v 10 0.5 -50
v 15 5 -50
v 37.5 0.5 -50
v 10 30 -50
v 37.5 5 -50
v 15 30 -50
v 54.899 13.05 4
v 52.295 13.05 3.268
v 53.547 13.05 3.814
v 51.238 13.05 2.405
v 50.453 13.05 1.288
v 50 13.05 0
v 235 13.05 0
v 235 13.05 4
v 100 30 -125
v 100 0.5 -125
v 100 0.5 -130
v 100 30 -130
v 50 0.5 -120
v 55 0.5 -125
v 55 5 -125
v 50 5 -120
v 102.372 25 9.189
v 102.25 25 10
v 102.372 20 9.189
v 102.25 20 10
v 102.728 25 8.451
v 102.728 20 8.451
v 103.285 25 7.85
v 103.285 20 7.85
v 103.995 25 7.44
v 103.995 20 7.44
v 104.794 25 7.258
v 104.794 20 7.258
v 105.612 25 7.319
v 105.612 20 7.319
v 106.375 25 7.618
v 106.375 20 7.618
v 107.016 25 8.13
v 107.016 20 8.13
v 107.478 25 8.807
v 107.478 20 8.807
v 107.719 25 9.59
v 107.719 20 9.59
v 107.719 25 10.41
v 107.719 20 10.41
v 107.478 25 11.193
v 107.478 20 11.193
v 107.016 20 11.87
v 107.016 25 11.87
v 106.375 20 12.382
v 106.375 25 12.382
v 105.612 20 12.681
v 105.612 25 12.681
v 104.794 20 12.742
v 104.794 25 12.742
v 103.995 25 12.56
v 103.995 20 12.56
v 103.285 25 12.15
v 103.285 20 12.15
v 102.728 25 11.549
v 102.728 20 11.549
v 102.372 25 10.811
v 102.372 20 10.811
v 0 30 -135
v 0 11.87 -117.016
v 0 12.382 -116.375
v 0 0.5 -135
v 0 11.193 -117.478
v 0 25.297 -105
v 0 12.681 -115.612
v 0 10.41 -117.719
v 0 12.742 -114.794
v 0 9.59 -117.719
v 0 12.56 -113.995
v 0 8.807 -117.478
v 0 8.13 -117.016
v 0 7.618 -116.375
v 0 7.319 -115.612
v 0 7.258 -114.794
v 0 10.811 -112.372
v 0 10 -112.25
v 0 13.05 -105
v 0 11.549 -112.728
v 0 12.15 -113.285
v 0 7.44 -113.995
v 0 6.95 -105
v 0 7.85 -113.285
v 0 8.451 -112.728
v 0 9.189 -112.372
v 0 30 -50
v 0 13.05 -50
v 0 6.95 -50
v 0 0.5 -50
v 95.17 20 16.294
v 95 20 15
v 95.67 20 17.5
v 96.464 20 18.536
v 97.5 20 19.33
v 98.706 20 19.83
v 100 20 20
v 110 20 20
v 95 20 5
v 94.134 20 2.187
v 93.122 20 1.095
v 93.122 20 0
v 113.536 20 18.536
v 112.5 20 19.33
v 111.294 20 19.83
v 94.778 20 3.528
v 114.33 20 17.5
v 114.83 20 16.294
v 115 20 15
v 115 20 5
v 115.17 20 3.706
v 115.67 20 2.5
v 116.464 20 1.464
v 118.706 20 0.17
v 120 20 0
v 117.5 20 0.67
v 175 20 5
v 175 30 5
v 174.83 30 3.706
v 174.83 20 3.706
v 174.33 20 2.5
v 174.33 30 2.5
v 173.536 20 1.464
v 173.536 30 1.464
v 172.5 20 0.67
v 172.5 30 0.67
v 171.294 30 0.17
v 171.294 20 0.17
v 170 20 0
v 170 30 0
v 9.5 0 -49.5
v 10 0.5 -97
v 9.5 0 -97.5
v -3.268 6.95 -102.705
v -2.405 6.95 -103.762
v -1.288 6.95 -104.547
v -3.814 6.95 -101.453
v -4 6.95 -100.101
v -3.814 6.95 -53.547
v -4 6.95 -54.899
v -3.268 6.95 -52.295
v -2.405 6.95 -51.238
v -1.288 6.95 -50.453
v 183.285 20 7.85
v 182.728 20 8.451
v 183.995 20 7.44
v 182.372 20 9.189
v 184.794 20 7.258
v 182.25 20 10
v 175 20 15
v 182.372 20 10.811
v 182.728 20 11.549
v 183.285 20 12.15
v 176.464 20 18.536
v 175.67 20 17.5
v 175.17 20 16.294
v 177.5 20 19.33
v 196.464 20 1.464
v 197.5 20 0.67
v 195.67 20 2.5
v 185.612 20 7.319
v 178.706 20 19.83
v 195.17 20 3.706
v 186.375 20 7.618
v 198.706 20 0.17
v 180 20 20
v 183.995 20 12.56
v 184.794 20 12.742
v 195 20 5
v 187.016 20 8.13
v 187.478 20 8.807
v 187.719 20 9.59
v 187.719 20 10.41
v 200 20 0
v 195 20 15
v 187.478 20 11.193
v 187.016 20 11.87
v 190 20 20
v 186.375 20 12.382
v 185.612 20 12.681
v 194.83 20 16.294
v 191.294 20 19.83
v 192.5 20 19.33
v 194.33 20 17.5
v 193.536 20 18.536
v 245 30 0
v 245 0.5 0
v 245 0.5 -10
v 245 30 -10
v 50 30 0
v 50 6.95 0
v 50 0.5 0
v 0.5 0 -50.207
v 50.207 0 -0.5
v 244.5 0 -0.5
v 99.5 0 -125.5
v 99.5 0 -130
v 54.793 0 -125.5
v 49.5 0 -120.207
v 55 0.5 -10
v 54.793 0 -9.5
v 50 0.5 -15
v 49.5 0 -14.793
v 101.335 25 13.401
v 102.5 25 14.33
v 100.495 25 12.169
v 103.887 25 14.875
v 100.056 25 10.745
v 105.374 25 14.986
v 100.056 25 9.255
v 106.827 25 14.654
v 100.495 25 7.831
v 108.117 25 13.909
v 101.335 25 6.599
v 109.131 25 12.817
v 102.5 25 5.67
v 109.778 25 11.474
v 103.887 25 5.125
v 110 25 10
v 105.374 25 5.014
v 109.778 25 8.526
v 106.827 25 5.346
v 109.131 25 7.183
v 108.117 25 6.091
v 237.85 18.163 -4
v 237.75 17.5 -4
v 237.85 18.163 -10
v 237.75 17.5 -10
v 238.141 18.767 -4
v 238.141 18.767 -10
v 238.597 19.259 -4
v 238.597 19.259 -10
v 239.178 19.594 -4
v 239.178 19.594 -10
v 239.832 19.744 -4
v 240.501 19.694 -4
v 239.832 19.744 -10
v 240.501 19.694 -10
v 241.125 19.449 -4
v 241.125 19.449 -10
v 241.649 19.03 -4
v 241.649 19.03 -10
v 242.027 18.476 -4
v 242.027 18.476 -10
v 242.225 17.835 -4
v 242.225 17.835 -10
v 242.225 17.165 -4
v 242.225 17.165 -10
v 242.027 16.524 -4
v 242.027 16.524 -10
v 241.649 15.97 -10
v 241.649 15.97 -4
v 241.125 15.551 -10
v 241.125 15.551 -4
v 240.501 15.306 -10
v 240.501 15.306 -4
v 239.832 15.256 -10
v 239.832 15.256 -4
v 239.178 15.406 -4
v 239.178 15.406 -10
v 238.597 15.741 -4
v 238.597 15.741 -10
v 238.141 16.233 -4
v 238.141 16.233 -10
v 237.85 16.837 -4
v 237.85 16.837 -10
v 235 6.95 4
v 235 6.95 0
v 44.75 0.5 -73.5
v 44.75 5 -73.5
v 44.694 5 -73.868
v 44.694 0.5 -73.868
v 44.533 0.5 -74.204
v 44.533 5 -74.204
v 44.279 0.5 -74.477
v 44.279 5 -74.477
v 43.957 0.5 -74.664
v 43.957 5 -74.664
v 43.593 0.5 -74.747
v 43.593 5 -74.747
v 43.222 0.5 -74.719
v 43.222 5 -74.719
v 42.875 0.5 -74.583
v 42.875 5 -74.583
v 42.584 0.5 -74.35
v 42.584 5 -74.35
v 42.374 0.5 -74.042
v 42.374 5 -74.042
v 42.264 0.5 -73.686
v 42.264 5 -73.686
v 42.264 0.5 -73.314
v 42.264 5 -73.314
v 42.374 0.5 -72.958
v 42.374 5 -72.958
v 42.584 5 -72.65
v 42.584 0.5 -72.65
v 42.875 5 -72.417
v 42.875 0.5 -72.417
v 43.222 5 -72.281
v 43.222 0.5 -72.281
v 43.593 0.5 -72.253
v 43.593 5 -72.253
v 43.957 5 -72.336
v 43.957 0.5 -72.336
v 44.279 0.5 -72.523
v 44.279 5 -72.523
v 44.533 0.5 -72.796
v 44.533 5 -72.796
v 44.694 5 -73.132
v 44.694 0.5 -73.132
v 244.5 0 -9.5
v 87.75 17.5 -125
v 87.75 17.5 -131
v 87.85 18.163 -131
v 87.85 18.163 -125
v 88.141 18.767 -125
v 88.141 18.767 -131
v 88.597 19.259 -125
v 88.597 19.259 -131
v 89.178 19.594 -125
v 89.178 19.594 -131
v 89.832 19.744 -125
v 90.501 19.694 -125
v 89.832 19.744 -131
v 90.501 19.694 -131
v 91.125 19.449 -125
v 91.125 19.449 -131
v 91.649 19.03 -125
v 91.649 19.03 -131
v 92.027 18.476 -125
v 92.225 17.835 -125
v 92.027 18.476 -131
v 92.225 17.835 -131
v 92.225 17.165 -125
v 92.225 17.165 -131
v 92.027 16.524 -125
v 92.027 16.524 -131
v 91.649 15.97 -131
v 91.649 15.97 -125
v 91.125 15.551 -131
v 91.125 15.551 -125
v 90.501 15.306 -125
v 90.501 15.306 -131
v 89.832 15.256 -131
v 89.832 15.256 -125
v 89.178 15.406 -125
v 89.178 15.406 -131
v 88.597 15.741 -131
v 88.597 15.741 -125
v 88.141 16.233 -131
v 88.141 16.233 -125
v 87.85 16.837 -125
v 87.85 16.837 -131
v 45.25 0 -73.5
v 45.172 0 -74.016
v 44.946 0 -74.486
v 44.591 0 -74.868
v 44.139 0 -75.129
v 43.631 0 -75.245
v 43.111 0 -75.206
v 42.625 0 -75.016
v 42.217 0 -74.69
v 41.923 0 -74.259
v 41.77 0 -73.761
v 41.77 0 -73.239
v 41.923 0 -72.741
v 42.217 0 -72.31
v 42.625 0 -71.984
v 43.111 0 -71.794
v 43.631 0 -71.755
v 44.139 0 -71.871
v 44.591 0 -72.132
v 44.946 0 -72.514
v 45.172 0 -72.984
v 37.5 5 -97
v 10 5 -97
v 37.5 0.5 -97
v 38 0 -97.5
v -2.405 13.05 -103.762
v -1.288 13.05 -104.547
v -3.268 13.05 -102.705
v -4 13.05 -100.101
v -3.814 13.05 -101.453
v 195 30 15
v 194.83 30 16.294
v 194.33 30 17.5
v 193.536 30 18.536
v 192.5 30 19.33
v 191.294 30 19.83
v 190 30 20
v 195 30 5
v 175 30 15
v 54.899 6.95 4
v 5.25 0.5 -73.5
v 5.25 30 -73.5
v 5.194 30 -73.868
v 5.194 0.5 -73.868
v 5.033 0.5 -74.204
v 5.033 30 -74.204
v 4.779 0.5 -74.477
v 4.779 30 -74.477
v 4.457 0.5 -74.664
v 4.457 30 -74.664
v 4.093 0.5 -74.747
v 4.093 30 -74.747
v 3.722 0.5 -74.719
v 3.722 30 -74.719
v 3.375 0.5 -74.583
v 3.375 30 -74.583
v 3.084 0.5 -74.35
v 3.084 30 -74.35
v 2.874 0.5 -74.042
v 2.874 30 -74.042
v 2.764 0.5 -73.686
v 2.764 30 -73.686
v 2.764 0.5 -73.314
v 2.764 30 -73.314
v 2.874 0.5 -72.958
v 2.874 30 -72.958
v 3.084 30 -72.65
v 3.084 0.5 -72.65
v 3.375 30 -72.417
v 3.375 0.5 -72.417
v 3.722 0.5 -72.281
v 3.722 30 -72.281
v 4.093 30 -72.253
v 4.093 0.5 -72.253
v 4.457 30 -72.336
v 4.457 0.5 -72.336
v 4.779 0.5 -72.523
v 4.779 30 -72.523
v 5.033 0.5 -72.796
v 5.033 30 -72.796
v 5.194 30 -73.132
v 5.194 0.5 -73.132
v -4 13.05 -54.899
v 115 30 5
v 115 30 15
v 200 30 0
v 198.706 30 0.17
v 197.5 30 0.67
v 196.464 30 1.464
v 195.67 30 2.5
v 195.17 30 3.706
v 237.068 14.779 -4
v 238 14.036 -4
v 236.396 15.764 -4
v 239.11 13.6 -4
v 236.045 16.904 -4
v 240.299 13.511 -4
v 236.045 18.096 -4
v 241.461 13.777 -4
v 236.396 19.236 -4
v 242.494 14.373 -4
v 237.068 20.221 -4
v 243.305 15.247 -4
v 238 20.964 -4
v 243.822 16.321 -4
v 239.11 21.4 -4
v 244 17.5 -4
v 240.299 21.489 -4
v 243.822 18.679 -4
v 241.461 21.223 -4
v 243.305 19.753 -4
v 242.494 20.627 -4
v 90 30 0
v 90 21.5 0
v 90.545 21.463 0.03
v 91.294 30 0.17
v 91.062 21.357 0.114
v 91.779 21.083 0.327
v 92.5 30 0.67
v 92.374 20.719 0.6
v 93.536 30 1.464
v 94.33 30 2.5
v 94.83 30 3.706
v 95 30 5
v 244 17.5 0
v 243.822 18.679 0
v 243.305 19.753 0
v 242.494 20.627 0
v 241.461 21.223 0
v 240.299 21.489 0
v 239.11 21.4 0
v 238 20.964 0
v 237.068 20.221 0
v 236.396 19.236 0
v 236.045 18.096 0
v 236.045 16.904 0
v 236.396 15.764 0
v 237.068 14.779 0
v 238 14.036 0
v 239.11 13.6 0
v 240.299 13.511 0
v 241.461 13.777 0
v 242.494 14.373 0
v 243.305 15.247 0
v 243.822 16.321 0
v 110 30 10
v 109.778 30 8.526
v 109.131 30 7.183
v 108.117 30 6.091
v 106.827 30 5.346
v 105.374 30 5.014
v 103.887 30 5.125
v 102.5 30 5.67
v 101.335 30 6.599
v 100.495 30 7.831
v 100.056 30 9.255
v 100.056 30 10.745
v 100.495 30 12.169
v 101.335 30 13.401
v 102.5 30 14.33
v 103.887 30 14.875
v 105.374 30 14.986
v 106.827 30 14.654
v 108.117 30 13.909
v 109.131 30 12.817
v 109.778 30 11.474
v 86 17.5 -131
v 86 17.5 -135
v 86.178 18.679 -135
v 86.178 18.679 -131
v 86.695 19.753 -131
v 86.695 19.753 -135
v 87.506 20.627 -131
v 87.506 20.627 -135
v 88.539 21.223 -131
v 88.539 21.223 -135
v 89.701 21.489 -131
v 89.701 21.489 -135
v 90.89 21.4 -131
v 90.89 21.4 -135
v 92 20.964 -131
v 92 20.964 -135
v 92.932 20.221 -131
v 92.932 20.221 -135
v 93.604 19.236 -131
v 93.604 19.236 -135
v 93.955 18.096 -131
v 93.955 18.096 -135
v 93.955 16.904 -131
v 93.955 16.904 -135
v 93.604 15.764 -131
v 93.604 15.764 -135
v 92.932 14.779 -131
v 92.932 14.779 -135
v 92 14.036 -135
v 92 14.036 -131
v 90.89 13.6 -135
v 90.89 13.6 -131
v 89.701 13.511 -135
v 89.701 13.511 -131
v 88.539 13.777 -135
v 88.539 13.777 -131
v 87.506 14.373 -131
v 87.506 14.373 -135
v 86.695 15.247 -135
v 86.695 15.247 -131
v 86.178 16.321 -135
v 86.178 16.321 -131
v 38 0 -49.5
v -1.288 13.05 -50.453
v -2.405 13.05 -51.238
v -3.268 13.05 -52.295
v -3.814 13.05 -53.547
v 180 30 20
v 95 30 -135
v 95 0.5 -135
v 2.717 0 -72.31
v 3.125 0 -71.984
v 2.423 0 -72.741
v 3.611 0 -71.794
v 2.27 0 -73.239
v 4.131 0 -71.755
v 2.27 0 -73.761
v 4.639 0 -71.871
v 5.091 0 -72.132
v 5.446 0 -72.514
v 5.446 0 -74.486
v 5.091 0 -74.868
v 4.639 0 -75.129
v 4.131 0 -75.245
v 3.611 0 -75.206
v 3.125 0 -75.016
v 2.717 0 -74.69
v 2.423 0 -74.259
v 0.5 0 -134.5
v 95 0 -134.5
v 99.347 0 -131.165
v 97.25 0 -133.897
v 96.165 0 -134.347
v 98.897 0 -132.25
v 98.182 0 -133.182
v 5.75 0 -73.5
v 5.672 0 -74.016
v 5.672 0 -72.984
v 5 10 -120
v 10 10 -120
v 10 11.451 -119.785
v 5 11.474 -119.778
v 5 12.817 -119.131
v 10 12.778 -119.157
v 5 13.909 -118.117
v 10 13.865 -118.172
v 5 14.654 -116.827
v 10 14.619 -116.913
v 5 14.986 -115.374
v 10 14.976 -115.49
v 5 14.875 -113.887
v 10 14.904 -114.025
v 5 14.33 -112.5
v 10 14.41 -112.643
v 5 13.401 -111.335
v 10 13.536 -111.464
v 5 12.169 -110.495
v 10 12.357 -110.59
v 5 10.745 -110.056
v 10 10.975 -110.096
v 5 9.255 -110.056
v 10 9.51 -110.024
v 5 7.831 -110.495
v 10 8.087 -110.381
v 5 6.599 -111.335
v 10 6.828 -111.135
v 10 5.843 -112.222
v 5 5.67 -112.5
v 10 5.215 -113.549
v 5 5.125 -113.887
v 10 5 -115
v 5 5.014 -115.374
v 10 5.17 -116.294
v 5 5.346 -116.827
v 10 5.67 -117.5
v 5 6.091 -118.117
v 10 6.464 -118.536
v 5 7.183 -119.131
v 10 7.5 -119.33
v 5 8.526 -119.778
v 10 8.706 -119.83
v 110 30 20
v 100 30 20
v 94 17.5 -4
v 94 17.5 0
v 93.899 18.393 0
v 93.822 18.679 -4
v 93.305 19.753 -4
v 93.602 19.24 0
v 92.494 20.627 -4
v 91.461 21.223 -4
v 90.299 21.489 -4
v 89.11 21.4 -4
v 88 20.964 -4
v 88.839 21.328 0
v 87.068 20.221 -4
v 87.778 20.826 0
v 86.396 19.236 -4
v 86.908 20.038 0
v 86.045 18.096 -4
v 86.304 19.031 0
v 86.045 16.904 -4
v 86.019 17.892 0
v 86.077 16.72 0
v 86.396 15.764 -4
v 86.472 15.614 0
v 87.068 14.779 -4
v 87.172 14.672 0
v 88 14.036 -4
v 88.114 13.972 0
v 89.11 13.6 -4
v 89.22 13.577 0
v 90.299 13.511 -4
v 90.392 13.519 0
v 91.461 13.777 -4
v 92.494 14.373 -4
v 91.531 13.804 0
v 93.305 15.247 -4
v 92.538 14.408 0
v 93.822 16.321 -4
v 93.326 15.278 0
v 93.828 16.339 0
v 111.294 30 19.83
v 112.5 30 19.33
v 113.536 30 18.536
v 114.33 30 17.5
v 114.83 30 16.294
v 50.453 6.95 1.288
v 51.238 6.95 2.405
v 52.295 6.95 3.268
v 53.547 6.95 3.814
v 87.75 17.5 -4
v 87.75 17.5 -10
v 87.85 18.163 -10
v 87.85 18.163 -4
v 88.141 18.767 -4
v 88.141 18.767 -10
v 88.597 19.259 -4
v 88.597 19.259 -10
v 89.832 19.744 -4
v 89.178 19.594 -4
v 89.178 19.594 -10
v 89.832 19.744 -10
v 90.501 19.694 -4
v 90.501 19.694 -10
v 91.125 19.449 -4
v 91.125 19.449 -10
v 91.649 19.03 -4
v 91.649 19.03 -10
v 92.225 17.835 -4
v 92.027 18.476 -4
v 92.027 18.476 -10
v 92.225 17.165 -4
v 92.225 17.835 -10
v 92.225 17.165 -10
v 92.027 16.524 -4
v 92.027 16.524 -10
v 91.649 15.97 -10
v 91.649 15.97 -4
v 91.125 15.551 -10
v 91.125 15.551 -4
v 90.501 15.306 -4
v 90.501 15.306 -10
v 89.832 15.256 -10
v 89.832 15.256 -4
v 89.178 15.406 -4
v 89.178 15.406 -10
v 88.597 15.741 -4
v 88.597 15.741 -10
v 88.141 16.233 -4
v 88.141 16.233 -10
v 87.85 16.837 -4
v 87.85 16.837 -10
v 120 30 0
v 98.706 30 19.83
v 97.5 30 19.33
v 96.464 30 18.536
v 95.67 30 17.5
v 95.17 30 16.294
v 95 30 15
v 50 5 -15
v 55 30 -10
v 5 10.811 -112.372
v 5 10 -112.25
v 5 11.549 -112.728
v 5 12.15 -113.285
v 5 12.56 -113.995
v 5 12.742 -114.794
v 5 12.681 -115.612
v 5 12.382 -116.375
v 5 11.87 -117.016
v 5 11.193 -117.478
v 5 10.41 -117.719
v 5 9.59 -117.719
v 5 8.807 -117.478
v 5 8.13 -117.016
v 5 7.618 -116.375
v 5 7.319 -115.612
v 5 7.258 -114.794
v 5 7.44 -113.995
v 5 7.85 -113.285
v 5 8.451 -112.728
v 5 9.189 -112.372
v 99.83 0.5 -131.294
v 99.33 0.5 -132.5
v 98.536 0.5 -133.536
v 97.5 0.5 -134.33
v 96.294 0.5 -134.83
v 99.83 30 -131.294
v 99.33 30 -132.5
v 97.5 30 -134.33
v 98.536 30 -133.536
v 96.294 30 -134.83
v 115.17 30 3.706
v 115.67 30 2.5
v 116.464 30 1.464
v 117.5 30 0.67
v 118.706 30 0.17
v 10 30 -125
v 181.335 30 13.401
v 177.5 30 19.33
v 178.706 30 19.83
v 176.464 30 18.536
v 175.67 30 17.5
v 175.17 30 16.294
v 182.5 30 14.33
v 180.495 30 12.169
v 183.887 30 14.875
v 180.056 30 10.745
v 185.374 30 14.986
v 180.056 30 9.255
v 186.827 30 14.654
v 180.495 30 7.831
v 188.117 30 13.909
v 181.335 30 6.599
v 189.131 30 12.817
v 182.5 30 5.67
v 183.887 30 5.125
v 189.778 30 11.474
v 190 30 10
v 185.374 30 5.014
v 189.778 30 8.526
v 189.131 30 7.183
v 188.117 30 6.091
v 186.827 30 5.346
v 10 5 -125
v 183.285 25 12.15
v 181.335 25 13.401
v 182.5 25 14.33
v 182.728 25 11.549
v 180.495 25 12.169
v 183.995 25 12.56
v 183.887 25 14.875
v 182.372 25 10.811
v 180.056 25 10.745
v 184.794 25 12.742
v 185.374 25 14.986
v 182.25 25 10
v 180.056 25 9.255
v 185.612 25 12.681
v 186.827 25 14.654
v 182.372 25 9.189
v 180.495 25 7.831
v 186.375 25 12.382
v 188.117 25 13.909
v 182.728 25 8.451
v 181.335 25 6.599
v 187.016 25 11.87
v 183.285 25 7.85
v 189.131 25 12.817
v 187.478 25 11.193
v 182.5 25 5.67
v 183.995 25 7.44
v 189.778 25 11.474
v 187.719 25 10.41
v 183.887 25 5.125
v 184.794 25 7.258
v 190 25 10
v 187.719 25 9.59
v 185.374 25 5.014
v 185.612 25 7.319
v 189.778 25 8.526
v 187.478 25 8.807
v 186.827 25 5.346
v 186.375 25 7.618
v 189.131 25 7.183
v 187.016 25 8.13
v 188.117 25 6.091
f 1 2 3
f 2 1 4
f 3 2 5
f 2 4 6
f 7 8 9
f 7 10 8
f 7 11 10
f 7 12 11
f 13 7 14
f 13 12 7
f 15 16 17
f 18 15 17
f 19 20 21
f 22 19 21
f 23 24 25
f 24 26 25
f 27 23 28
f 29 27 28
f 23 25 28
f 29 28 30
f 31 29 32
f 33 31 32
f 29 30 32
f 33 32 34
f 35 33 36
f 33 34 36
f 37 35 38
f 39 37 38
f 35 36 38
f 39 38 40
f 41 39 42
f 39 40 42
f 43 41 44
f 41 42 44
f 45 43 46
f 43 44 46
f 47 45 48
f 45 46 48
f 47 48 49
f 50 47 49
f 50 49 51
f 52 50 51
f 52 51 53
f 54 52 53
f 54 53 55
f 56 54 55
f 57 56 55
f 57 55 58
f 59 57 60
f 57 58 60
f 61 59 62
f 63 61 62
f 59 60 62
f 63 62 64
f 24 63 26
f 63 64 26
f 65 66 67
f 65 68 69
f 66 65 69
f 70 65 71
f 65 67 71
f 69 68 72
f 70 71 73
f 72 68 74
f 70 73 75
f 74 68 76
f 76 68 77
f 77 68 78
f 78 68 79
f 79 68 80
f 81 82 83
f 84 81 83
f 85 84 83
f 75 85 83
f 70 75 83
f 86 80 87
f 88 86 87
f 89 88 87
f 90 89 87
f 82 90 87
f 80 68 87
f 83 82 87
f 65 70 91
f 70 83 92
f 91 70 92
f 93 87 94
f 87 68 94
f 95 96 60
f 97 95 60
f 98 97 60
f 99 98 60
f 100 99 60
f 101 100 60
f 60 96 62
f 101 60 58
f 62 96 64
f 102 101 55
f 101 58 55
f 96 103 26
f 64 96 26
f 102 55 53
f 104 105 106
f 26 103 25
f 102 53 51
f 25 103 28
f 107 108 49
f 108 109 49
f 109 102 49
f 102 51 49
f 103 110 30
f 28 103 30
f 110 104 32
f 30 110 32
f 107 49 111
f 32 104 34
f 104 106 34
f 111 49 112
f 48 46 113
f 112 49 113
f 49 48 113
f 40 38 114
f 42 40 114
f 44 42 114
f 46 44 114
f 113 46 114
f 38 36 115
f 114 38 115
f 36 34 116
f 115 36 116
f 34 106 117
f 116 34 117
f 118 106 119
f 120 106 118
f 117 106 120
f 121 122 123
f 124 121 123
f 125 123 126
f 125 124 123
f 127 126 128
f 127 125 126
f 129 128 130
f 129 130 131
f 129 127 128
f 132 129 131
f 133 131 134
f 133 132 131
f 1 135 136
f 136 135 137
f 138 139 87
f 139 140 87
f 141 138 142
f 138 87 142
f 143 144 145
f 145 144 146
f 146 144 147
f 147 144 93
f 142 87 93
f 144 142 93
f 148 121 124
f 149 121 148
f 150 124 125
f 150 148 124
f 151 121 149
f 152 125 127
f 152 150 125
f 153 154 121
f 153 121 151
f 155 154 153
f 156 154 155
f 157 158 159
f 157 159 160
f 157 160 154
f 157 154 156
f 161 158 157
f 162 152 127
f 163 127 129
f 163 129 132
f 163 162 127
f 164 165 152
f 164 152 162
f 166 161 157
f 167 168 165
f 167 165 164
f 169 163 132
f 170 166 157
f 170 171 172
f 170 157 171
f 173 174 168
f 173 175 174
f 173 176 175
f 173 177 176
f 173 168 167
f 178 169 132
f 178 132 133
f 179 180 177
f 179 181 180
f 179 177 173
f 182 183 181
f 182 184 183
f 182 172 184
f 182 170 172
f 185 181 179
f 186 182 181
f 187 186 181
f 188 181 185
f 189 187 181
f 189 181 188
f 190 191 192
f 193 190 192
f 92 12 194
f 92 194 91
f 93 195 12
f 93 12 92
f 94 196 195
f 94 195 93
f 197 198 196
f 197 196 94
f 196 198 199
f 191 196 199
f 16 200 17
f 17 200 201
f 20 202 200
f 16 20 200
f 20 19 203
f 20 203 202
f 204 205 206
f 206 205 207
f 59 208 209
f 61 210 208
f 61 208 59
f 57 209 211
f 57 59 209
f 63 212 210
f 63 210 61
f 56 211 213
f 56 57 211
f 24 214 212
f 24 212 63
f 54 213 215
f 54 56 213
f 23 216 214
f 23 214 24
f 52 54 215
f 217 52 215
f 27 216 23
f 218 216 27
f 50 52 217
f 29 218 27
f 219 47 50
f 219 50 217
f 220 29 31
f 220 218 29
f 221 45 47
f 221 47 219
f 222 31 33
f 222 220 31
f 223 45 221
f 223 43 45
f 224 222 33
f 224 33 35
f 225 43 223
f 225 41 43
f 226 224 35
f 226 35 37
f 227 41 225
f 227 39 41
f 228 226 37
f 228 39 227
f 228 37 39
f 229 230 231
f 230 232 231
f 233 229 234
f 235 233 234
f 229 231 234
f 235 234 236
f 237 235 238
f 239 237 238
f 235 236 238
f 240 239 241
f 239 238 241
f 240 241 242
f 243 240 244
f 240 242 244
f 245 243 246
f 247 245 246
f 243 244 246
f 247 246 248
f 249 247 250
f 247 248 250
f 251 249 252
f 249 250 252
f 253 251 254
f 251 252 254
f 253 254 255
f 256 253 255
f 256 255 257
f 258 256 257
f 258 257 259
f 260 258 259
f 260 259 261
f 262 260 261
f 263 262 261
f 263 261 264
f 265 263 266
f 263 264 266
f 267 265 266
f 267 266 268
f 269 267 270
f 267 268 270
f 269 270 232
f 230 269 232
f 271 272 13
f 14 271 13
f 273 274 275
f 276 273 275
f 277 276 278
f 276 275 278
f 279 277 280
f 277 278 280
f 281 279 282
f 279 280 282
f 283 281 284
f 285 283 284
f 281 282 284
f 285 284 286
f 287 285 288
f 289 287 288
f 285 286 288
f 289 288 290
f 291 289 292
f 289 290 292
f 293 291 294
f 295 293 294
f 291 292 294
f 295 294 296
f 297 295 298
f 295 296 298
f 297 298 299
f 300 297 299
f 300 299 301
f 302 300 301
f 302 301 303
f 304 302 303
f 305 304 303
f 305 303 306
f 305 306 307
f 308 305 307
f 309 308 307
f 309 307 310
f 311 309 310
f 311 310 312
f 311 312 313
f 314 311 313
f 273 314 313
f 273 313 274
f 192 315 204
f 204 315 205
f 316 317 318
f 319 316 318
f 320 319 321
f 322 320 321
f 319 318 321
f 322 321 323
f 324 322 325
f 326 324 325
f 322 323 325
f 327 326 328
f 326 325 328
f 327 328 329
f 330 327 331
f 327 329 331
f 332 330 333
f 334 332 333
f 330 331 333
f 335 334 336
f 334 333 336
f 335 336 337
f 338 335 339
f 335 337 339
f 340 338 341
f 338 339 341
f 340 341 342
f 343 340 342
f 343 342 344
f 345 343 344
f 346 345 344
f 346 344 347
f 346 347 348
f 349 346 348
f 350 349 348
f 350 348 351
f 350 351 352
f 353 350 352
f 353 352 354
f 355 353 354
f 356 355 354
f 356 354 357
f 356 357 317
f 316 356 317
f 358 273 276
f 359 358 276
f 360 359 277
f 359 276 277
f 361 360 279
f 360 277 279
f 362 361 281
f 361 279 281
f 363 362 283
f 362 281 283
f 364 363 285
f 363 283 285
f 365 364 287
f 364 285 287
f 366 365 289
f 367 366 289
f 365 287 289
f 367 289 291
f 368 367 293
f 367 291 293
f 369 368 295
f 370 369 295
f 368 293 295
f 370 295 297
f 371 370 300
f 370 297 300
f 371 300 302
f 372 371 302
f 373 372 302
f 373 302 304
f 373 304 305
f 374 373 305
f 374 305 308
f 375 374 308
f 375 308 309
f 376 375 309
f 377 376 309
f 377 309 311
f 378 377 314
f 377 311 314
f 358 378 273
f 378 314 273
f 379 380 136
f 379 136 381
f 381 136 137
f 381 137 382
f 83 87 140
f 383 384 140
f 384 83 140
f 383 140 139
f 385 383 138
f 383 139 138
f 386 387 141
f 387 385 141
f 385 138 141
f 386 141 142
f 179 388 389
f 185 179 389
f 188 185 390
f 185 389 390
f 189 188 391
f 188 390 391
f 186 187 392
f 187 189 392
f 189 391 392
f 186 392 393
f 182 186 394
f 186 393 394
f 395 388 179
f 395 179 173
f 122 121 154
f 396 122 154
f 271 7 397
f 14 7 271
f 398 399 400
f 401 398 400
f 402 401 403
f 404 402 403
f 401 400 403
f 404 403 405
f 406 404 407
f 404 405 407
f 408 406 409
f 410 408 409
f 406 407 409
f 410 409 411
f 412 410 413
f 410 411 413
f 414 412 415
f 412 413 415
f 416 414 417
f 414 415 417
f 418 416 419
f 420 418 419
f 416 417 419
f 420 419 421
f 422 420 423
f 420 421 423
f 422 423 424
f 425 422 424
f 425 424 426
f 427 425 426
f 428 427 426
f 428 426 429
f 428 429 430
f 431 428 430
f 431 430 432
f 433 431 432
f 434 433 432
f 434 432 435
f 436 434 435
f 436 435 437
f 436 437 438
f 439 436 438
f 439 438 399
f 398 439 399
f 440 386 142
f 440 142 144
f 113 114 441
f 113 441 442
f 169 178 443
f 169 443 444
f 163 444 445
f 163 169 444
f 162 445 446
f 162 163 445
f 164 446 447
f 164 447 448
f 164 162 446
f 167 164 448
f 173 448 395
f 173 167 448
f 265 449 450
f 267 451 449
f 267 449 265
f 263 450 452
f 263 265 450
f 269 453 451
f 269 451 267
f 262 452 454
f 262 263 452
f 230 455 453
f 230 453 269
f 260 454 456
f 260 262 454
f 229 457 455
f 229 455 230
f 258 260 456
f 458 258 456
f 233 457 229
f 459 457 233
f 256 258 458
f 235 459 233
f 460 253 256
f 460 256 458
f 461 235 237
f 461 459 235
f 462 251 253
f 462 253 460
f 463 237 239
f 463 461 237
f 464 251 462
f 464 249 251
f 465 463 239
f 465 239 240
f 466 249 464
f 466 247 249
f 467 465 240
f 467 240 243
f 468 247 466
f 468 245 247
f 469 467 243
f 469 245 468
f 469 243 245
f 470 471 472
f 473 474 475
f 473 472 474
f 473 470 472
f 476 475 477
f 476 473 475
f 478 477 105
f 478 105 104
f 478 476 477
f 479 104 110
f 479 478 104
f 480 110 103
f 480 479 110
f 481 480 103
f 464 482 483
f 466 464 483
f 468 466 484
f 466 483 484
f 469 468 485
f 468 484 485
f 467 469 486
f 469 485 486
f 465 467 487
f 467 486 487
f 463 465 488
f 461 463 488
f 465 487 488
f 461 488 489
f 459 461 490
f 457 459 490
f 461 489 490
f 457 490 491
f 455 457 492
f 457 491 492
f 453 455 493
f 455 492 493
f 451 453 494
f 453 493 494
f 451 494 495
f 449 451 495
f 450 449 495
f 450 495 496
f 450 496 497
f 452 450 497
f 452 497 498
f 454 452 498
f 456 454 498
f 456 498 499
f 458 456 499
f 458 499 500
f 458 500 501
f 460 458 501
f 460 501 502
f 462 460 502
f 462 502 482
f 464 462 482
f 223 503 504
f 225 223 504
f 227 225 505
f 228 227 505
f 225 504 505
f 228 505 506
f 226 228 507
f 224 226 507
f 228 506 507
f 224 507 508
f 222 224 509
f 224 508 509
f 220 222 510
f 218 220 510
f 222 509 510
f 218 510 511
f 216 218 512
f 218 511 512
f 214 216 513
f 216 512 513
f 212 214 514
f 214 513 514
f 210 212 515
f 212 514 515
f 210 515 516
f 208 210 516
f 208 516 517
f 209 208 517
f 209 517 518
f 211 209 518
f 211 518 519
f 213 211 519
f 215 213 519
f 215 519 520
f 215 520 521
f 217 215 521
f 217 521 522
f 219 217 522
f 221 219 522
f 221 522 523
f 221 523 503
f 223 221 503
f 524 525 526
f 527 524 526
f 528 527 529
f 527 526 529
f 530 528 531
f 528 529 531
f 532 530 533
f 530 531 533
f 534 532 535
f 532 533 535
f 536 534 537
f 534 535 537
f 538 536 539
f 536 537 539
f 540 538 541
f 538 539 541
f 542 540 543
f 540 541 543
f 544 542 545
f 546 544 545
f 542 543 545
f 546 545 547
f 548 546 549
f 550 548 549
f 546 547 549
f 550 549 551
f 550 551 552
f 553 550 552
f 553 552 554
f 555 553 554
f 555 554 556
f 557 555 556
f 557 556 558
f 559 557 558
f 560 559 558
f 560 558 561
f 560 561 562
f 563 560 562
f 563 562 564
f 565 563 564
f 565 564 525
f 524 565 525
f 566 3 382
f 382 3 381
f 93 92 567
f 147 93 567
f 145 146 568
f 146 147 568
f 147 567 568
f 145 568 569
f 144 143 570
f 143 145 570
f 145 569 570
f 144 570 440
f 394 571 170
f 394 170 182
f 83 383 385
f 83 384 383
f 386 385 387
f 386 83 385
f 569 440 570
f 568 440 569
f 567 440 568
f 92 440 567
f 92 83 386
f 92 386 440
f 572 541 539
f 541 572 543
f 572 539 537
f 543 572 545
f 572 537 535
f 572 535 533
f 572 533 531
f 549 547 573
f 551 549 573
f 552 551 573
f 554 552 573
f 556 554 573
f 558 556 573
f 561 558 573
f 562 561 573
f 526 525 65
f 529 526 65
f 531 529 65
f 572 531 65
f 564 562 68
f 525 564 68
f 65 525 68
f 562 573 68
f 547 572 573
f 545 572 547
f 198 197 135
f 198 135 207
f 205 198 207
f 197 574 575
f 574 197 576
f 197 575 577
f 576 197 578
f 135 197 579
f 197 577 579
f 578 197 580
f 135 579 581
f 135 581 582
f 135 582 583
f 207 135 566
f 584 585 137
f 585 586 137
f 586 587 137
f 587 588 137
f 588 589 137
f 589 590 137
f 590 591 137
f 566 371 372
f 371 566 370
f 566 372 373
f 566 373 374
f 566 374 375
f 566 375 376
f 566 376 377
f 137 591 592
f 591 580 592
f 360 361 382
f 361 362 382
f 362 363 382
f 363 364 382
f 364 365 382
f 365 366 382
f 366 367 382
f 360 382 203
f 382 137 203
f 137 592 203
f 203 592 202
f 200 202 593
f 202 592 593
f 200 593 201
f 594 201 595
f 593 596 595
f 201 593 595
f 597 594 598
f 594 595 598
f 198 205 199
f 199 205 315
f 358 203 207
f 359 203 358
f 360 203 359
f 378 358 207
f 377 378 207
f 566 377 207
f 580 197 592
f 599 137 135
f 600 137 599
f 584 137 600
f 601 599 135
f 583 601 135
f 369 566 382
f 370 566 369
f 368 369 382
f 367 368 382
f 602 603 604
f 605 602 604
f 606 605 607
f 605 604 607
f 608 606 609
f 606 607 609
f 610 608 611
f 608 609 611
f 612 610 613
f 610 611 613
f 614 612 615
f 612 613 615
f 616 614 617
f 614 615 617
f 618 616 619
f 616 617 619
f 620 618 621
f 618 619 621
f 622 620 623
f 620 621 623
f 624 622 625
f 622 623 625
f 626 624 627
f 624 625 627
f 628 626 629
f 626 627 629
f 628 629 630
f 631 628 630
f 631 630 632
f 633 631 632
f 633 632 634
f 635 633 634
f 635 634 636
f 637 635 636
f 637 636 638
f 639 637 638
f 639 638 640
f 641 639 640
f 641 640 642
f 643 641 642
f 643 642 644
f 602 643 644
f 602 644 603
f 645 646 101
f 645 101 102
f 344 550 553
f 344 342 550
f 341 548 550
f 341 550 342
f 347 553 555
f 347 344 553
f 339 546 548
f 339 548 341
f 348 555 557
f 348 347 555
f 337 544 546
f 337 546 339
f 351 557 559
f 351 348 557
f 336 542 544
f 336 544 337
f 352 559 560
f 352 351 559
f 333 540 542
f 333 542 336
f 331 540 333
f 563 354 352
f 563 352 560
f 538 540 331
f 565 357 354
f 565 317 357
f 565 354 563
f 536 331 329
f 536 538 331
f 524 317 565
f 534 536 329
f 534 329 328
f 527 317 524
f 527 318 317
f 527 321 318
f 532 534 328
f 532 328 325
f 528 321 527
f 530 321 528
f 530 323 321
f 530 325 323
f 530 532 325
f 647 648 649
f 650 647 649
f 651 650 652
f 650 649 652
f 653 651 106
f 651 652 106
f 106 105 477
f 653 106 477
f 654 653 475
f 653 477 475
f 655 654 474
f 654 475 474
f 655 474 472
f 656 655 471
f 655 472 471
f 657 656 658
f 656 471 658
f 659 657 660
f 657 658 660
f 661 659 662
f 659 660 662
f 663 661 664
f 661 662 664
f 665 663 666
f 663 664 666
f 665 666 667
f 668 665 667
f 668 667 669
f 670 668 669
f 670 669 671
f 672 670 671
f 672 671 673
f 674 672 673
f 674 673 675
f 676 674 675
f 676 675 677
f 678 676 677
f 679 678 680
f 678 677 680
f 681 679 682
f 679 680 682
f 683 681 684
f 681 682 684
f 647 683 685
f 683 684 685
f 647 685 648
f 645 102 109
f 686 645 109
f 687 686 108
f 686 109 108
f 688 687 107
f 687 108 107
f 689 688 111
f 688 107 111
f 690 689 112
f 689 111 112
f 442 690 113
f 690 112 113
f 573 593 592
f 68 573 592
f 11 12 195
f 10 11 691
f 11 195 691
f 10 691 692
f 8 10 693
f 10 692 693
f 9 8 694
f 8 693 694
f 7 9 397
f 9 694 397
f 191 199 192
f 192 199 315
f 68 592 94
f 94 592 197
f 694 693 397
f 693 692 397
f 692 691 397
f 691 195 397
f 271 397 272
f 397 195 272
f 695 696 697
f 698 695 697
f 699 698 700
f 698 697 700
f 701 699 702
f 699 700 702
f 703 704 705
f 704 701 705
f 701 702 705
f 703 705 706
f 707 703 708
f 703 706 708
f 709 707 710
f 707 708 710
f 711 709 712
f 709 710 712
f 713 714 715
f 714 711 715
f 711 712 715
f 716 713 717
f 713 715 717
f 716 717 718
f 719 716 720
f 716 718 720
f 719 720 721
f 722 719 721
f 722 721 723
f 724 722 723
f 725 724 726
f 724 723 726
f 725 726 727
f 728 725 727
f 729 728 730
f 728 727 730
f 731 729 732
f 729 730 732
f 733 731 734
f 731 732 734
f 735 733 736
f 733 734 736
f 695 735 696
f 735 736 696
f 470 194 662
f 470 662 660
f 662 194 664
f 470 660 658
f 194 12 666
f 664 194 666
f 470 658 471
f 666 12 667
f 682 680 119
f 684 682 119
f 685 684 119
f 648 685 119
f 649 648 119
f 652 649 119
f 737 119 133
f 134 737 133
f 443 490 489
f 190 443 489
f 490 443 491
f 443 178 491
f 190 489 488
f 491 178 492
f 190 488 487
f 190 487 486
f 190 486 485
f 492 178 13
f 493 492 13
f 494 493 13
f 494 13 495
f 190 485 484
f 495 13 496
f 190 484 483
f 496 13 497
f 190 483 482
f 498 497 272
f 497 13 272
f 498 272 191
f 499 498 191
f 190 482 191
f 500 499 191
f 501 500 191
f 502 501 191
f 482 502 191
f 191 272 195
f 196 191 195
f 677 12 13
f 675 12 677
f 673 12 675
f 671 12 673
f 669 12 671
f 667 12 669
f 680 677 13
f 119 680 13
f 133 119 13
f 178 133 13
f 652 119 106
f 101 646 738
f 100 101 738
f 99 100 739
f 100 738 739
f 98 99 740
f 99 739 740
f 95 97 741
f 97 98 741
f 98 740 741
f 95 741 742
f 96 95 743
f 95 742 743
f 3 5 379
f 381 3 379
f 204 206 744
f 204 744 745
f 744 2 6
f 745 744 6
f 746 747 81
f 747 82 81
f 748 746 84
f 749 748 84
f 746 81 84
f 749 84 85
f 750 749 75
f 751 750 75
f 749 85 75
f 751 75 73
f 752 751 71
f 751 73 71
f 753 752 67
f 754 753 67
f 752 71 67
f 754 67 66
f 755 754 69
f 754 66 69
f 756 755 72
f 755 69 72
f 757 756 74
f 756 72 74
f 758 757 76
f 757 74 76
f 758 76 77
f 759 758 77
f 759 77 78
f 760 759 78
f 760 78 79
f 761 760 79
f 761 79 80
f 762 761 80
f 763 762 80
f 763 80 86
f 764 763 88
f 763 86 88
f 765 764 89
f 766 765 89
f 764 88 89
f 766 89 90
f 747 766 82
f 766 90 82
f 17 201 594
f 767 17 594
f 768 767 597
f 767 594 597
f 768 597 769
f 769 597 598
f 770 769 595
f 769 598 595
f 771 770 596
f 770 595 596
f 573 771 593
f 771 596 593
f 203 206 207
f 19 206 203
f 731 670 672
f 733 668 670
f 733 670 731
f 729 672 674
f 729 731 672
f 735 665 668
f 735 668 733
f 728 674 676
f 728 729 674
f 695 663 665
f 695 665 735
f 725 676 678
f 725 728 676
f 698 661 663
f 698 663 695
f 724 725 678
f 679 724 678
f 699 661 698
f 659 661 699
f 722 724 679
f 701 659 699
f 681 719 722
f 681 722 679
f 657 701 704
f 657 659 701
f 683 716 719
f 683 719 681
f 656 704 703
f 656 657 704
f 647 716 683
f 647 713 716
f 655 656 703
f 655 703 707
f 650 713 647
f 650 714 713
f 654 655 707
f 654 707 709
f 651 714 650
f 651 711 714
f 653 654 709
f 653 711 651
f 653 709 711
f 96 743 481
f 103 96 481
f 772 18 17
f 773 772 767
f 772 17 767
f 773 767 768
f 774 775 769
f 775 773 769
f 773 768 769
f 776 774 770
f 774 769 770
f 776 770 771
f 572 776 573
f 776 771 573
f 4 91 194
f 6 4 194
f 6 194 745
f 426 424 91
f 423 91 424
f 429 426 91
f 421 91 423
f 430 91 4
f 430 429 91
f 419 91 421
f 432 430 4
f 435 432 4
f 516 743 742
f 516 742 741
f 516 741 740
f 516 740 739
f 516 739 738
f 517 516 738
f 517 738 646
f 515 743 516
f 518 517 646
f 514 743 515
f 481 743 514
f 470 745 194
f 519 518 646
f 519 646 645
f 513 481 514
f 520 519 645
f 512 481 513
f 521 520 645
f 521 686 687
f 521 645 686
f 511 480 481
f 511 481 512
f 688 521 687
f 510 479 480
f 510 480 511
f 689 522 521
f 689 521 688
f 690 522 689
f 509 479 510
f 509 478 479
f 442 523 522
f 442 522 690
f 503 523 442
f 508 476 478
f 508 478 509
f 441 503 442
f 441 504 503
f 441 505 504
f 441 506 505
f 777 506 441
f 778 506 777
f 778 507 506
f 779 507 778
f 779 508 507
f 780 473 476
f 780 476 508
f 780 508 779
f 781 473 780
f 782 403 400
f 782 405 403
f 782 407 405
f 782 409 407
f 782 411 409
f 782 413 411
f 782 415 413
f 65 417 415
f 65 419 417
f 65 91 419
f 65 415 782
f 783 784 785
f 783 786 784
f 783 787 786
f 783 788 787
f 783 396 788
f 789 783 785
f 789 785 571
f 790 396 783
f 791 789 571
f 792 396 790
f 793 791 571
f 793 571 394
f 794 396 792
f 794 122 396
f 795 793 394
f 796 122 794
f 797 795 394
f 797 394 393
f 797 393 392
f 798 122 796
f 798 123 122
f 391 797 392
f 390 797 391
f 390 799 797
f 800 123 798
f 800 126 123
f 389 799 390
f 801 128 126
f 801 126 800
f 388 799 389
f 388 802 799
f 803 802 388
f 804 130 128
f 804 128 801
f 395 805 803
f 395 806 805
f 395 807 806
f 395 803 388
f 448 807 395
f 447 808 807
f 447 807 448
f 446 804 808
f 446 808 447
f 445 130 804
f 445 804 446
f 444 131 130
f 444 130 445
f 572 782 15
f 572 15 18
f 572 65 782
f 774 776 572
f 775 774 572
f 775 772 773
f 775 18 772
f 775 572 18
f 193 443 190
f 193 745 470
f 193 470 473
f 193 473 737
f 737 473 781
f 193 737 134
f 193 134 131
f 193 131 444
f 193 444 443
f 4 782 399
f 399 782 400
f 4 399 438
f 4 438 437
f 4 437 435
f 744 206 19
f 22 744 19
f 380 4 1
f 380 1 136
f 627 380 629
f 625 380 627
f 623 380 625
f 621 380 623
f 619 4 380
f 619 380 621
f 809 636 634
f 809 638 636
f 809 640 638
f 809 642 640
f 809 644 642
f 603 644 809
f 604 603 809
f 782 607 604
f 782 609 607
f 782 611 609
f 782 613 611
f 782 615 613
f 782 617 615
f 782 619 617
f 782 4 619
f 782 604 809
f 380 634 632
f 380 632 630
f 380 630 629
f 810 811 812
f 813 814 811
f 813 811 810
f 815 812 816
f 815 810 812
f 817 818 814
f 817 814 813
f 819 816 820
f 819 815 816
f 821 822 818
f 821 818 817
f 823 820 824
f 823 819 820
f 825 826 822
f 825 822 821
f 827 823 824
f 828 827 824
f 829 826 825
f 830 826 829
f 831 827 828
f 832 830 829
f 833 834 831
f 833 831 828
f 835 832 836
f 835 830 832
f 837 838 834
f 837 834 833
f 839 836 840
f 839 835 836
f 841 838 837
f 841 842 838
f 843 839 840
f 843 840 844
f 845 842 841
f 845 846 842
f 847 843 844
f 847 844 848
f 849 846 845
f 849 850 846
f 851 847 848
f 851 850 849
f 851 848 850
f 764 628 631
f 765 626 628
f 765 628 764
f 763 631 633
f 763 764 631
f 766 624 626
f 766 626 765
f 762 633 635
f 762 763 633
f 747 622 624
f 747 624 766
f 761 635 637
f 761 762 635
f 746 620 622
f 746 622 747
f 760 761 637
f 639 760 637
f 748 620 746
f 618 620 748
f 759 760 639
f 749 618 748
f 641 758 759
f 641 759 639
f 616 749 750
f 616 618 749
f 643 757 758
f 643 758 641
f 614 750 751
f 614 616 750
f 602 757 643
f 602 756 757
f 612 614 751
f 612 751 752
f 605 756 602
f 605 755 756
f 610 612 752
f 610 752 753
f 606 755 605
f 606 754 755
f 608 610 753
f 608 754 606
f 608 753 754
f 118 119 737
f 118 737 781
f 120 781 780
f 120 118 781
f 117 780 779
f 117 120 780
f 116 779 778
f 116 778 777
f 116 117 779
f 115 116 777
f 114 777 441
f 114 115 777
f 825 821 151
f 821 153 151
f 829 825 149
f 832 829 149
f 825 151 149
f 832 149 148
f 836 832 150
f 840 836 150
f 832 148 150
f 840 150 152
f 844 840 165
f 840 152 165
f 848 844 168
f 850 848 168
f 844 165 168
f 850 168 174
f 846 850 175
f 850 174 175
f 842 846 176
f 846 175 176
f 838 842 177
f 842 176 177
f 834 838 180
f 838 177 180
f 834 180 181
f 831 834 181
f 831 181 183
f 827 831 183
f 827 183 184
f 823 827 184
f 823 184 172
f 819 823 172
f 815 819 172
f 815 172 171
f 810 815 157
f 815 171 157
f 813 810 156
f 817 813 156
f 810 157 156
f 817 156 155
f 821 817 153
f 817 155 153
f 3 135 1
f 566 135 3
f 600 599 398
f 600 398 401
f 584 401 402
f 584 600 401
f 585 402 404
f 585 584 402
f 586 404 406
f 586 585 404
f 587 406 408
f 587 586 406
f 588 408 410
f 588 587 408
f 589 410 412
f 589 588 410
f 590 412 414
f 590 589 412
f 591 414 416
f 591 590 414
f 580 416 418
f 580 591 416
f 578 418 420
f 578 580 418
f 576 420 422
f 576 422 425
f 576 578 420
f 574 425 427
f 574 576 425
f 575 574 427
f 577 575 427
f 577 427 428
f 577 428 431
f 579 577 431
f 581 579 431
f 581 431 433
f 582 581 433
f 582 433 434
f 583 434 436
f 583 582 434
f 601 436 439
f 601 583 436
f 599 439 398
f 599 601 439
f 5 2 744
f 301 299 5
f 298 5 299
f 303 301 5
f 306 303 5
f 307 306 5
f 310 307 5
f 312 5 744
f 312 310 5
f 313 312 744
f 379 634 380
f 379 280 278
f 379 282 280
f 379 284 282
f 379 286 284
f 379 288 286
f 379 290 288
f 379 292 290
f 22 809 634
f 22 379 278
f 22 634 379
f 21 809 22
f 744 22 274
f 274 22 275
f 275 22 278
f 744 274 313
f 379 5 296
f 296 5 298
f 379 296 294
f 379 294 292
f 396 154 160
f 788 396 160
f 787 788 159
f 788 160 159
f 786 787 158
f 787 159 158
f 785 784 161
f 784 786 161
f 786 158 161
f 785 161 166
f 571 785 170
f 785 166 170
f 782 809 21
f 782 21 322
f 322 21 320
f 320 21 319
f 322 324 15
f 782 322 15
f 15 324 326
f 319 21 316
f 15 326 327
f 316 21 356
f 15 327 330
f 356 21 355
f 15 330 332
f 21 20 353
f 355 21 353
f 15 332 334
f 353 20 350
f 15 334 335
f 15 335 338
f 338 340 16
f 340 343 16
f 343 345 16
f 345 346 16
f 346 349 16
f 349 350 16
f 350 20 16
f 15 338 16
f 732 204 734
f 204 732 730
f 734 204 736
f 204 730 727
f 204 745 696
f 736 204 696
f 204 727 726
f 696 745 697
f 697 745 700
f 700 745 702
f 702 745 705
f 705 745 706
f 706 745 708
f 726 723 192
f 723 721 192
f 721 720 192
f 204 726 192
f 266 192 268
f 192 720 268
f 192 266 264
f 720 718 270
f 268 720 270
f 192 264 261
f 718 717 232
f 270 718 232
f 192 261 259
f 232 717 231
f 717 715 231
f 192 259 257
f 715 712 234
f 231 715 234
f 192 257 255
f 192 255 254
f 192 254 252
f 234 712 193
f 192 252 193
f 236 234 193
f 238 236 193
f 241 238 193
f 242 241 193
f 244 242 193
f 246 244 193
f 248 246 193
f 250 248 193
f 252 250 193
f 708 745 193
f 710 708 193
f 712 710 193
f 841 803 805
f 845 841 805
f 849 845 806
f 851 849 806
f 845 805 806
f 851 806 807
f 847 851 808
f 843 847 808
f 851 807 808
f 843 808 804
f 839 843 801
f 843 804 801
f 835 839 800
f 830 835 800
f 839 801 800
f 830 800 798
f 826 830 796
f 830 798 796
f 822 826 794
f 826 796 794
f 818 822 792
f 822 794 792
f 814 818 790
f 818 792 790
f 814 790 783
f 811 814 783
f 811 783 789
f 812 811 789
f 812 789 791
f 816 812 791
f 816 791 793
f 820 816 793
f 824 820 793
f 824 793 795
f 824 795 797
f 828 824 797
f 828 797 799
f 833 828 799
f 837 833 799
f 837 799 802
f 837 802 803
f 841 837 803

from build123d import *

# Parameters (mm, degrees)
BOSS_EXTRUDE1_DEPTH            = 30
CUT_EXTRUDE1_DEPTH             = 282.336097933
CHAMFER1_SIZE                  = 5
CBORE_FOR_M4_SHCS2_D           = 4.5
CBORE_FOR_M4_SHCS2_CBORE_D     = 8
CBORE_FOR_M4_SHCS2_CBORE_DEPTH = 4
CBORE_FOR_M4_SHCS1_D           = 4.5
CBORE_FOR_M4_SHCS1_CBORE_D     = 8
CBORE_FOR_M4_SHCS1_CBORE_DEPTH = 4
CUT_EXTRUDE2_DEPTH             = 25
SKETCH11_W                     = 27.5
SKETCH11_H                     = 47
CUT_EXTRUDE3_DEPTH             = 282.336097933
CBORE_FOR_M5_SHCS2_D           = 5.5
CBORE_FOR_M5_SHCS2_CBORE_D     = 10
CBORE_FOR_M5_SHCS2_CBORE_DEPTH = 5
M3X0_5_TAPPED_HOLE1_D          = 2.5
SKETCH21_W                     = 185
SKETCH21_H                     = 6.1
BOSS_EXTRUDE3_DEPTH            = 4
SKETCH22_W                     = 55
SKETCH22_H                     = 6.1
BOSS_EXTRUDE4_DEPTH            = 4
SKETCH23_W                     = 100
SKETCH23_H                     = 30
BOSS_EXTRUDE5_DEPTH            = 10
SKETCH24_W                     = 60
SKETCH24_H                     = 20
CUT_EXTRUDE4_DEPTH             = 10
CBORE_FOR_M5_SHCS3_D           = 5.5
CBORE_FOR_M5_SHCS3_CBORE_D     = 10
CBORE_FOR_M5_SHCS3_CBORE_DEPTH = 5
FILLET1_R                      = 5
CHAMFER2_SIZE                  = 0.5


with BuildPart() as part:
    # Sketch1 → Boss-Extrude1 (new body)
    with BuildSketch(Plane(origin=(0, 0, 0), x_dir=(1, 0, 0), z_dir=(0, 1, 0))):
        Polygon((245, 10), (50, 10), (50, 125), (100, 125), (100, 135), (0, 135), (0, 0), (245, 0), align=None)
    extrude(amount=BOSS_EXTRUDE1_DEPTH)

    # Sketch3 → Cut-Extrude1 (cut, through all)
    with BuildSketch(Plane.XZ):
        Polygon((50, 0), (0, -50), (0, 0), align=None)
    extrude(amount=-CUT_EXTRUDE1_DEPTH, mode=Mode.SUBTRACT)

    # Chamfer1
    chamfer1_edges = [part.edges().sort_by_distance(p)[0] for p in [
        (50, 15, -125),
        (50, 15, -10),
    ]]
    chamfer(chamfer1_edges, length=CHAMFER1_SIZE)

    # CBORE for M4 SHCS2 (through all)
    with Locations(Plane.XY):
        with Locations((240, 17.5), (90, 17.5)):
            CounterBoreHole(CBORE_FOR_M4_SHCS2_D / 2, CBORE_FOR_M4_SHCS2_CBORE_D / 2, CBORE_FOR_M4_SHCS2_CBORE_DEPTH)

    # CBORE for M4 SHCS1 (through all)
    with Locations(Plane(origin=(0, 0, -135), x_dir=(-1, 0, 0), z_dir=(0, 0, -1))):
        with Locations((-90, 17.5)):
            CounterBoreHole(CBORE_FOR_M4_SHCS1_D / 2, CBORE_FOR_M4_SHCS1_CBORE_D / 2, CBORE_FOR_M4_SHCS1_CBORE_DEPTH)

    # Sketch10 → Cut-Extrude2 (cut)
    with BuildSketch(Plane(origin=(0, 30, 0), x_dir=(1, 0, 0), z_dir=(0, 1, 0))):
        Polygon((55, 125), (10, 125), (10, 55), (50, 15), align=None)
    extrude(amount=-CUT_EXTRUDE2_DEPTH, mode=Mode.SUBTRACT)

    # Sketch11 → Cut-Extrude3 (cut, through all)
    with BuildSketch(Plane(origin=(0, 30, 0), x_dir=(1, 0, 0), z_dir=(0, 1, 0))):
        with Locations((23.75, 73.5)):
            Rectangle(SKETCH11_W, SKETCH11_H)
    extrude(amount=-CUT_EXTRUDE3_DEPTH, mode=Mode.SUBTRACT)

    # CBORE for M5 SHCS2 (through all)
    with Locations(Plane(origin=(10, 0, 0), x_dir=(0, 0, -1), z_dir=(1, 0, 0))):
        with Locations((115, 10)):
            CounterBoreHole(CBORE_FOR_M5_SHCS2_D / 2, CBORE_FOR_M5_SHCS2_CBORE_D / 2, CBORE_FOR_M5_SHCS2_CBORE_DEPTH)

    # M3x0.5 Tapped Hole1 (through all)
    with Locations(Plane(origin=(0, 0, 0), x_dir=(-1, 0, 0), z_dir=(0, -1, 0))):
        with Locations((-4, 73.5), (-43.5, 73.5)):
            Hole(M3X0_5_TAPPED_HOLE1_D / 2)

    # Sketch21 → Boss-Extrude3 (add)
    with BuildSketch(Plane.XY):
        with Locations((142.5, 10)):
            Rectangle(SKETCH21_W, SKETCH21_H)
    extrude(amount=BOSS_EXTRUDE3_DEPTH)

    # Sketch22 → Boss-Extrude4 (add)
    with BuildSketch(Plane.ZY):
        with Locations((-77.5, 10)):
            Rectangle(SKETCH22_W, SKETCH22_H)
    extrude(amount=BOSS_EXTRUDE4_DEPTH)

    # Sketch23 → Boss-Extrude5 (add)
    with BuildSketch(Plane(origin=(0, 30, 0), x_dir=(1, 0, 0), z_dir=(0, 1, 0))):
        with Locations((145, -5)):
            Rectangle(SKETCH23_W, SKETCH23_H)
    extrude(amount=-BOSS_EXTRUDE5_DEPTH)

    # Sketch24 → Cut-Extrude4 (cut)
    with BuildSketch(Plane.XZ.offset(-20)):
        with Locations((145, 10)):
            Rectangle(SKETCH24_W, SKETCH24_H)
    extrude(amount=-CUT_EXTRUDE4_DEPTH, mode=Mode.SUBTRACT)

    # CBORE for M5 SHCS3 (through all)
    with Locations(Plane(origin=(0, 30, 0), x_dir=(1, 0, 0), z_dir=(0, 1, 0))):
        with Locations((105, -10), (185, -10)):
            CounterBoreHole(CBORE_FOR_M5_SHCS3_D / 2, CBORE_FOR_M5_SHCS3_CBORE_D / 2, CBORE_FOR_M5_SHCS3_CBORE_DEPTH)

    # Fillet1
    # the kernel refuses this fillet: 5 mm, written as the material it adds along each edge
    with BuildSketch(Plane(origin=(195, 20, 0), x_dir=(1, 0, 0), z_dir=(0, 1, 0)), Plane(origin=(115, 20, 0), x_dir=(1, 0, 0), z_dir=(0, 1, 0))) as fillet1_piece_1:
        with BuildLine():
            CenterArc((FILLET1_R, -FILLET1_R), FILLET1_R, 90, 90)
            Line((0, -FILLET1_R), (0, 0))
            Line((0, 0), (FILLET1_R, 0))
        make_face()
    extrude(amount=10)
    with BuildSketch(Plane(origin=(175, 20, 0), x_dir=(-1, 0, 0), z_dir=(0, 1, 0))) as fillet1_piece_2:
        with BuildLine():
            CenterArc((FILLET1_R, FILLET1_R), FILLET1_R, 180, 90)
            Line((0, FILLET1_R), (0, 0))
            Line((0, 0), (FILLET1_R, 0))
        make_face()
    extrude(amount=10)
    with BuildSketch(Plane(origin=(95, 30, 0), x_dir=(-1, 0, 0), z_dir=(0, -1, 0))) as fillet1_piece_3_section:
        with BuildLine():
            CenterArc((FILLET1_R, -FILLET1_R), FILLET1_R, 90, 90)
            Line((0, -FILLET1_R), (0, 0))
            Line((0, 0), (FILLET1_R, 0))
        make_face()
    fillet1_piece_3 = extrude(amount=10, mode=Mode.PRIVATE)
    fillet1_piece_3 = fillet1_piece_3 - Plane(origin=(90, 17.5, 0), x_dir=(1, 0, 0), z_dir=(0, 0, 1)) * Cylinder(4, 40, mode=Mode.PRIVATE)
    add(fillet1_piece_3)
    # the kernel refuses this fillet: 5 mm, written as the material it takes off along each edge
    with BuildSketch(Plane(origin=(-4, -5.297448714, -105), x_dir=(0, 0, 1), z_dir=(0, 1, 0)), Plane(origin=(50, -5.297448714, 4), x_dir=(1, 0, 0), z_dir=(0, 1, 0))) as fillet1_2_piece_1:
        with BuildLine():
            CenterArc((4.898979486, 5), FILLET1_R, 191.536959033, 78.463040967)
            Line((0, 4), (0, 0))
            Line((0, 0), (4.898979486, 0))
        make_face()
    extrude(amount=30.594897428, mode=Mode.SUBTRACT)
    with BuildSketch(Plane(origin=(-4, 25.297448714, -50), x_dir=(1.0, 0, -1.5791812302263136e-12), z_dir=(0, -1, 0))) as fillet1_2_piece_2:
        with BuildLine():
            CenterArc((5, -4.898979486), FILLET1_R, 101.536959033, 78.463040967)
            Line((0, -4.898979486), (0, 0))
            Line((0, 0), (4, 0))
        make_face()
    extrude(amount=30.594897428, mode=Mode.SUBTRACT)
    with BuildSketch(Plane(origin=(195, 42.5, 20), x_dir=(0, 0, -1), z_dir=(0, -1, 0)), Plane(origin=(95, 42.5, 20), x_dir=(1, 0, 0), z_dir=(0, -1, 0))) as fillet1_2_piece_3:
        with BuildLine():
            CenterArc((FILLET1_R, -FILLET1_R), FILLET1_R, 90, 90)
            Line((0, -FILLET1_R), (0, 0))
            Line((0, 0), (FILLET1_R, 0))
        make_face()
    extrude(amount=35, mode=Mode.SUBTRACT)
    with BuildSketch(Plane(origin=(175, 7.5, 20), x_dir=(1, 0, 0), z_dir=(0, 1, 0)), Plane(origin=(115, 7.5, 20), x_dir=(0, 0, -1), z_dir=(0, 1, 0))) as fillet1_2_piece_4:
        with BuildLine():
            CenterArc((FILLET1_R, FILLET1_R), FILLET1_R, 180, 90)
            Line((0, FILLET1_R), (0, 0))
            Line((0, 0), (FILLET1_R, 0))
        make_face()
    extrude(amount=35, mode=Mode.SUBTRACT)
    with BuildSketch(Plane(origin=(100, -12.5, -135), x_dir=(0, 0, 1), z_dir=(0, 1, 0))) as fillet1_2_piece_5:
        with BuildLine():
            CenterArc((FILLET1_R, -FILLET1_R), FILLET1_R, 90, 90)
            Line((0, -FILLET1_R), (0, 0))
            Line((0, 0), (FILLET1_R, 0))
        make_face()
    extrude(amount=55, mode=Mode.SUBTRACT)

    # Chamfer2
    chamfer2_edges = [part.edges().sort_by_distance(p)[0] for p in [
        (150, 0, -10),
        (10, 0, -73.5),
        (37.5, 0, -73.5),
        (23.75, 0, -50),
        (23.75, 0, -97),
        (245, 0, -5),
        (0, 0, -92.5),
        (42.25, 0, -73.5),
        (2.75, 0, -73.5),
        (47.5, 0, -135),
        (98.535533906, 0, -133.535533906),
        (147.5, 0, 0),
        (25, 0, -25),
        (77.5, 0, -125),
        (50, 0, -67.5),
        (52.5, 0, -122.5),
        (52.5, 0, -12.5),
        (100, 0, -127.5),
    ]]
    chamfer(chamfer2_edges, length=CHAMFER2_SIZE)


solid = part.part
